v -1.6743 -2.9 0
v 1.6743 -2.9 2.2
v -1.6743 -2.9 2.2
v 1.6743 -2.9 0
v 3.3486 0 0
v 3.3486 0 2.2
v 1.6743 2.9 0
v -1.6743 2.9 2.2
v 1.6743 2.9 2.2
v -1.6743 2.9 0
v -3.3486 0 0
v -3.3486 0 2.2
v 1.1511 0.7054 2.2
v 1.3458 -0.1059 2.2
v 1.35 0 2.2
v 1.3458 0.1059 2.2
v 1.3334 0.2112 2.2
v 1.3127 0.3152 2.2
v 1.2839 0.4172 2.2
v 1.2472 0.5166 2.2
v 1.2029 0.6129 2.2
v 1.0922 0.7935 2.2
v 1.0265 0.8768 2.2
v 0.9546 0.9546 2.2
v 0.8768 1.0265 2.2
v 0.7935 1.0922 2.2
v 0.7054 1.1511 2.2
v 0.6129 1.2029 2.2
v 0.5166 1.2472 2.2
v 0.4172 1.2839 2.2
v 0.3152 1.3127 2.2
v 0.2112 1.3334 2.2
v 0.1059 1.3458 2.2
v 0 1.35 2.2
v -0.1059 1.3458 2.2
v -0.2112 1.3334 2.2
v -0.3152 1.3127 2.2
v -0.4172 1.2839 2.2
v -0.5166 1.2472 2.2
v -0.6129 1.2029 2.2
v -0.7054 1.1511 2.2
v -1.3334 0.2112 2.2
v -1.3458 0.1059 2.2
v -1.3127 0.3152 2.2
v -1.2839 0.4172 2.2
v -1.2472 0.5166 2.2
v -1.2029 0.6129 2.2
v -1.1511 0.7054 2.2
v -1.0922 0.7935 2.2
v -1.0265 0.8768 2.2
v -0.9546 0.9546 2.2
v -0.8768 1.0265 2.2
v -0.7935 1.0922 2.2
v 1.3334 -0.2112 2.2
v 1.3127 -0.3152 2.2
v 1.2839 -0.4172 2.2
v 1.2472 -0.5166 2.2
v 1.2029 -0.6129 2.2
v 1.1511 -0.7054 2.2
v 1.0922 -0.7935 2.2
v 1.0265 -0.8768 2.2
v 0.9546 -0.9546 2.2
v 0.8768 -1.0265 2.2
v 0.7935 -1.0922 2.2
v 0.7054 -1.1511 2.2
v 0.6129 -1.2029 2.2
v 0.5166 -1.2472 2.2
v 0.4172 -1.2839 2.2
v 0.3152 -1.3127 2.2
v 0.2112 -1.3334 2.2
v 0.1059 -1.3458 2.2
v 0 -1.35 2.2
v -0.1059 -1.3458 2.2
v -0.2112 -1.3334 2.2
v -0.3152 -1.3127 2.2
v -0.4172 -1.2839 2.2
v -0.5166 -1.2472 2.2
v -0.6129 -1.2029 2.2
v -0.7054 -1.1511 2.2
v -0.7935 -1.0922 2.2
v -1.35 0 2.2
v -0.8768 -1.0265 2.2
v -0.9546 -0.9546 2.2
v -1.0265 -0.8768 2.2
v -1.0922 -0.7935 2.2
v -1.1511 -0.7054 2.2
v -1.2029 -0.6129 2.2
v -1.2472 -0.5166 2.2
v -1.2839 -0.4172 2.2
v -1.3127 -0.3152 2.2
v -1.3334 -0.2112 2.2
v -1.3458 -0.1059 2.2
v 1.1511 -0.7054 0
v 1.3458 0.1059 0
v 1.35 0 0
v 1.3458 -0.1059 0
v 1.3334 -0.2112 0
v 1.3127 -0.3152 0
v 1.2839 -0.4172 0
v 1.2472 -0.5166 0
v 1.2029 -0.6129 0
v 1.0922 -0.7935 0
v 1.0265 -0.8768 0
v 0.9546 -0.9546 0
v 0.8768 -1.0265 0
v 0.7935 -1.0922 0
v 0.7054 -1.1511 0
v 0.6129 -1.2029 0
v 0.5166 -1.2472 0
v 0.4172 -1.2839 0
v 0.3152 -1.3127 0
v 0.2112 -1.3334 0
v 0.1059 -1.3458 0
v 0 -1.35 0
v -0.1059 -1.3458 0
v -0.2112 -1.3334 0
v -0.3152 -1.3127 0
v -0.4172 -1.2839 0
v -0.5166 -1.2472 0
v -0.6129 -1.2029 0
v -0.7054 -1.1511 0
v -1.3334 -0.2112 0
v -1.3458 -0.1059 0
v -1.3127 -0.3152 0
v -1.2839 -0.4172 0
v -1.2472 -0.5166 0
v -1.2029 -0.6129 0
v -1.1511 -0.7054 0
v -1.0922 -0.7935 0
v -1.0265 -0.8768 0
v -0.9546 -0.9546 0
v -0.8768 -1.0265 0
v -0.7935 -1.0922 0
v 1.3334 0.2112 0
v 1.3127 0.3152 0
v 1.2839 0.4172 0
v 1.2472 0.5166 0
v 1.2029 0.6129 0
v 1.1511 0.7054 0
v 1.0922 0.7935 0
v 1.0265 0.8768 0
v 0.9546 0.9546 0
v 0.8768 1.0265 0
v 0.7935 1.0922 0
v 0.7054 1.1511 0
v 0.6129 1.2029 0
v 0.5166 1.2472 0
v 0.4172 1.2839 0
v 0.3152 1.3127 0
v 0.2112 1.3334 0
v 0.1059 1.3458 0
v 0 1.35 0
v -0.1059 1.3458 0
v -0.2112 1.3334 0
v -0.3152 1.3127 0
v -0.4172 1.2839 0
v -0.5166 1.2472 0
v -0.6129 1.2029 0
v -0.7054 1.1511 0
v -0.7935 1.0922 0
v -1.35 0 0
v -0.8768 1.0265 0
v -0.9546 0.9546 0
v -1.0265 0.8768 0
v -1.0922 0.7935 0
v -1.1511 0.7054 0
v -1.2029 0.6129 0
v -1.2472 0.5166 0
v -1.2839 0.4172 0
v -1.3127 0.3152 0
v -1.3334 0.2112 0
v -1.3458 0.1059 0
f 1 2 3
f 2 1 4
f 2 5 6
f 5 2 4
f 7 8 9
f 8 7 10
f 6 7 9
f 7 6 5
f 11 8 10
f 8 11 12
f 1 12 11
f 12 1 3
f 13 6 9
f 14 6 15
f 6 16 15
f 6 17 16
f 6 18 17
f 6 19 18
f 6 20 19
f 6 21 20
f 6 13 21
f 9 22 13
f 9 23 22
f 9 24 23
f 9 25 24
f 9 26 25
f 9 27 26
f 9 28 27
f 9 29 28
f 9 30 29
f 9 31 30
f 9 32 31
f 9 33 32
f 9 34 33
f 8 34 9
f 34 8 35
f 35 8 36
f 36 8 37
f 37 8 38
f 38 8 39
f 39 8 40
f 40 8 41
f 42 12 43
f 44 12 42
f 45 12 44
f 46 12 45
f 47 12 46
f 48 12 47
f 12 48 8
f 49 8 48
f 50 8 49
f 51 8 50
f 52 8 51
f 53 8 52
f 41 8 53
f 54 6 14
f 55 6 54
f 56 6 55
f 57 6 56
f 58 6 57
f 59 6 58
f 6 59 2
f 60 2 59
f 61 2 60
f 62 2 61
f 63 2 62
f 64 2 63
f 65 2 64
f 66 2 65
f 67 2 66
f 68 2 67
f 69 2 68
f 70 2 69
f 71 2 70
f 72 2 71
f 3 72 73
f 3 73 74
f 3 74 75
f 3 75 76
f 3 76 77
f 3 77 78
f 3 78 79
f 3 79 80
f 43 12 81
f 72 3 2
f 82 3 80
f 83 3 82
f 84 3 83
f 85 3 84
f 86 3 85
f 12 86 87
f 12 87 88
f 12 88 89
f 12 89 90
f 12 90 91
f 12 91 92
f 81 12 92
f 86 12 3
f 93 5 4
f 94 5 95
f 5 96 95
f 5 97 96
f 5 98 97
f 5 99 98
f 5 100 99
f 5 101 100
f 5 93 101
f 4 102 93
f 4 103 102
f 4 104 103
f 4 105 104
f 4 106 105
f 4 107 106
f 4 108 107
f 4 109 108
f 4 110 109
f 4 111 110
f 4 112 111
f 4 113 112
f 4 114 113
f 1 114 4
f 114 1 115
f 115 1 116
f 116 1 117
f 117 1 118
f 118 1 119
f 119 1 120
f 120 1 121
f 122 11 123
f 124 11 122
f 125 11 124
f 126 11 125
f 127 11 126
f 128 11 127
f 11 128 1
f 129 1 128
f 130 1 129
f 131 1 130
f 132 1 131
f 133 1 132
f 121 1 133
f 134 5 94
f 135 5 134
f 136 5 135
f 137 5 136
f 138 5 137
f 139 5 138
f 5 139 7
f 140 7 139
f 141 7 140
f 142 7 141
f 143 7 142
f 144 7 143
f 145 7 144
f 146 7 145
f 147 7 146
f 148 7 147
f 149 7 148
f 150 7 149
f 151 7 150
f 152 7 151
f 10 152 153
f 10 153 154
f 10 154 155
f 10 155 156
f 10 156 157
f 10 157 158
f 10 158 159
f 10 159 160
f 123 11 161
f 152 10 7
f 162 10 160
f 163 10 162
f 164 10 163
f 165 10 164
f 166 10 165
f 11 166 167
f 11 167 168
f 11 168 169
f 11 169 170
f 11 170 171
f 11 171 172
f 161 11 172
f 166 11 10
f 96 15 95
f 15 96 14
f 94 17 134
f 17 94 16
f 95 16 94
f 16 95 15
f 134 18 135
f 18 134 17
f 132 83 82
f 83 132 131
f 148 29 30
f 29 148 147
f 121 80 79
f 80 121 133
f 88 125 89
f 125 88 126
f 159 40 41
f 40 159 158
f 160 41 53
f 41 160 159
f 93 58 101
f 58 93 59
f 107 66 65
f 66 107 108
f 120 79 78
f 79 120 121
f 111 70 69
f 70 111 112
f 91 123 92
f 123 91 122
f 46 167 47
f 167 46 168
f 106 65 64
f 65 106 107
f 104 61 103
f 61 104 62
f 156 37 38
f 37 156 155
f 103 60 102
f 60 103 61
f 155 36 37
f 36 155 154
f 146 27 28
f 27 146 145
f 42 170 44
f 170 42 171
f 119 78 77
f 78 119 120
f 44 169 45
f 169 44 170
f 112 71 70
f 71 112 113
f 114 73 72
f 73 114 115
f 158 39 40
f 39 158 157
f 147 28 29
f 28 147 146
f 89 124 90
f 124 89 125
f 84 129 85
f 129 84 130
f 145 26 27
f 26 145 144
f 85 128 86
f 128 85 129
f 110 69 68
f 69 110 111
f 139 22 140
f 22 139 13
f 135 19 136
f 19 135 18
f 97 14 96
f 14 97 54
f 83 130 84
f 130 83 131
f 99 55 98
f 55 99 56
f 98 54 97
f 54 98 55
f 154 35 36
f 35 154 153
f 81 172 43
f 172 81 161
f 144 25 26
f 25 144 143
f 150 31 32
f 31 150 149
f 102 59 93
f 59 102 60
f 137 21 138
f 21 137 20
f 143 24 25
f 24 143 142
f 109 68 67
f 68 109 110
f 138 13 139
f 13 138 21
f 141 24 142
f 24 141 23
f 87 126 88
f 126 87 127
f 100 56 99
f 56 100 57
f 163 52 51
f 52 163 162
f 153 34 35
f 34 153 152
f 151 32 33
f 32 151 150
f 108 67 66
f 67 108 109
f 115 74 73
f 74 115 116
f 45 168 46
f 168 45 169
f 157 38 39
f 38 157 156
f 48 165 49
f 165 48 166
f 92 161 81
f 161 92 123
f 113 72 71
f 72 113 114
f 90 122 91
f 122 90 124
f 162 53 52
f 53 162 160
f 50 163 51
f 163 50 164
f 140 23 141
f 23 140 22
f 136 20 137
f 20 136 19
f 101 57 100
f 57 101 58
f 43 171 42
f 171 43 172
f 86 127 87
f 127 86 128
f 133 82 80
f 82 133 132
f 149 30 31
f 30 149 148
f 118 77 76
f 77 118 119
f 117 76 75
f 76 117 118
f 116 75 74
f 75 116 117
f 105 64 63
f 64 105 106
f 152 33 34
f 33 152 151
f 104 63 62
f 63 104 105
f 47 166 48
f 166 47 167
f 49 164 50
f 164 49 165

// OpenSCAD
$fn = 120;

across_flats = 5.8;   // mm
thickness    = 2.2;   // mm
hole_d       = 2.7;   // mm (clearance for M2.5 screw)

module hex_prism_af(af, h) {
    // For a regular hexagon: across_flats = 2 * apothem
    // apothem = R * cos(30°) where R is circumradius (vertex radius)
    R = af / (2 * cos(30));
    cylinder(h = h, r = R, $fn = 6);
}

difference() {
    hex_prism_af(across_flats, thickness);
    translate([0, 0, -0.2])
        cylinder(h = thickness + 0.4, d = hole_d, $fn = 80);
}
